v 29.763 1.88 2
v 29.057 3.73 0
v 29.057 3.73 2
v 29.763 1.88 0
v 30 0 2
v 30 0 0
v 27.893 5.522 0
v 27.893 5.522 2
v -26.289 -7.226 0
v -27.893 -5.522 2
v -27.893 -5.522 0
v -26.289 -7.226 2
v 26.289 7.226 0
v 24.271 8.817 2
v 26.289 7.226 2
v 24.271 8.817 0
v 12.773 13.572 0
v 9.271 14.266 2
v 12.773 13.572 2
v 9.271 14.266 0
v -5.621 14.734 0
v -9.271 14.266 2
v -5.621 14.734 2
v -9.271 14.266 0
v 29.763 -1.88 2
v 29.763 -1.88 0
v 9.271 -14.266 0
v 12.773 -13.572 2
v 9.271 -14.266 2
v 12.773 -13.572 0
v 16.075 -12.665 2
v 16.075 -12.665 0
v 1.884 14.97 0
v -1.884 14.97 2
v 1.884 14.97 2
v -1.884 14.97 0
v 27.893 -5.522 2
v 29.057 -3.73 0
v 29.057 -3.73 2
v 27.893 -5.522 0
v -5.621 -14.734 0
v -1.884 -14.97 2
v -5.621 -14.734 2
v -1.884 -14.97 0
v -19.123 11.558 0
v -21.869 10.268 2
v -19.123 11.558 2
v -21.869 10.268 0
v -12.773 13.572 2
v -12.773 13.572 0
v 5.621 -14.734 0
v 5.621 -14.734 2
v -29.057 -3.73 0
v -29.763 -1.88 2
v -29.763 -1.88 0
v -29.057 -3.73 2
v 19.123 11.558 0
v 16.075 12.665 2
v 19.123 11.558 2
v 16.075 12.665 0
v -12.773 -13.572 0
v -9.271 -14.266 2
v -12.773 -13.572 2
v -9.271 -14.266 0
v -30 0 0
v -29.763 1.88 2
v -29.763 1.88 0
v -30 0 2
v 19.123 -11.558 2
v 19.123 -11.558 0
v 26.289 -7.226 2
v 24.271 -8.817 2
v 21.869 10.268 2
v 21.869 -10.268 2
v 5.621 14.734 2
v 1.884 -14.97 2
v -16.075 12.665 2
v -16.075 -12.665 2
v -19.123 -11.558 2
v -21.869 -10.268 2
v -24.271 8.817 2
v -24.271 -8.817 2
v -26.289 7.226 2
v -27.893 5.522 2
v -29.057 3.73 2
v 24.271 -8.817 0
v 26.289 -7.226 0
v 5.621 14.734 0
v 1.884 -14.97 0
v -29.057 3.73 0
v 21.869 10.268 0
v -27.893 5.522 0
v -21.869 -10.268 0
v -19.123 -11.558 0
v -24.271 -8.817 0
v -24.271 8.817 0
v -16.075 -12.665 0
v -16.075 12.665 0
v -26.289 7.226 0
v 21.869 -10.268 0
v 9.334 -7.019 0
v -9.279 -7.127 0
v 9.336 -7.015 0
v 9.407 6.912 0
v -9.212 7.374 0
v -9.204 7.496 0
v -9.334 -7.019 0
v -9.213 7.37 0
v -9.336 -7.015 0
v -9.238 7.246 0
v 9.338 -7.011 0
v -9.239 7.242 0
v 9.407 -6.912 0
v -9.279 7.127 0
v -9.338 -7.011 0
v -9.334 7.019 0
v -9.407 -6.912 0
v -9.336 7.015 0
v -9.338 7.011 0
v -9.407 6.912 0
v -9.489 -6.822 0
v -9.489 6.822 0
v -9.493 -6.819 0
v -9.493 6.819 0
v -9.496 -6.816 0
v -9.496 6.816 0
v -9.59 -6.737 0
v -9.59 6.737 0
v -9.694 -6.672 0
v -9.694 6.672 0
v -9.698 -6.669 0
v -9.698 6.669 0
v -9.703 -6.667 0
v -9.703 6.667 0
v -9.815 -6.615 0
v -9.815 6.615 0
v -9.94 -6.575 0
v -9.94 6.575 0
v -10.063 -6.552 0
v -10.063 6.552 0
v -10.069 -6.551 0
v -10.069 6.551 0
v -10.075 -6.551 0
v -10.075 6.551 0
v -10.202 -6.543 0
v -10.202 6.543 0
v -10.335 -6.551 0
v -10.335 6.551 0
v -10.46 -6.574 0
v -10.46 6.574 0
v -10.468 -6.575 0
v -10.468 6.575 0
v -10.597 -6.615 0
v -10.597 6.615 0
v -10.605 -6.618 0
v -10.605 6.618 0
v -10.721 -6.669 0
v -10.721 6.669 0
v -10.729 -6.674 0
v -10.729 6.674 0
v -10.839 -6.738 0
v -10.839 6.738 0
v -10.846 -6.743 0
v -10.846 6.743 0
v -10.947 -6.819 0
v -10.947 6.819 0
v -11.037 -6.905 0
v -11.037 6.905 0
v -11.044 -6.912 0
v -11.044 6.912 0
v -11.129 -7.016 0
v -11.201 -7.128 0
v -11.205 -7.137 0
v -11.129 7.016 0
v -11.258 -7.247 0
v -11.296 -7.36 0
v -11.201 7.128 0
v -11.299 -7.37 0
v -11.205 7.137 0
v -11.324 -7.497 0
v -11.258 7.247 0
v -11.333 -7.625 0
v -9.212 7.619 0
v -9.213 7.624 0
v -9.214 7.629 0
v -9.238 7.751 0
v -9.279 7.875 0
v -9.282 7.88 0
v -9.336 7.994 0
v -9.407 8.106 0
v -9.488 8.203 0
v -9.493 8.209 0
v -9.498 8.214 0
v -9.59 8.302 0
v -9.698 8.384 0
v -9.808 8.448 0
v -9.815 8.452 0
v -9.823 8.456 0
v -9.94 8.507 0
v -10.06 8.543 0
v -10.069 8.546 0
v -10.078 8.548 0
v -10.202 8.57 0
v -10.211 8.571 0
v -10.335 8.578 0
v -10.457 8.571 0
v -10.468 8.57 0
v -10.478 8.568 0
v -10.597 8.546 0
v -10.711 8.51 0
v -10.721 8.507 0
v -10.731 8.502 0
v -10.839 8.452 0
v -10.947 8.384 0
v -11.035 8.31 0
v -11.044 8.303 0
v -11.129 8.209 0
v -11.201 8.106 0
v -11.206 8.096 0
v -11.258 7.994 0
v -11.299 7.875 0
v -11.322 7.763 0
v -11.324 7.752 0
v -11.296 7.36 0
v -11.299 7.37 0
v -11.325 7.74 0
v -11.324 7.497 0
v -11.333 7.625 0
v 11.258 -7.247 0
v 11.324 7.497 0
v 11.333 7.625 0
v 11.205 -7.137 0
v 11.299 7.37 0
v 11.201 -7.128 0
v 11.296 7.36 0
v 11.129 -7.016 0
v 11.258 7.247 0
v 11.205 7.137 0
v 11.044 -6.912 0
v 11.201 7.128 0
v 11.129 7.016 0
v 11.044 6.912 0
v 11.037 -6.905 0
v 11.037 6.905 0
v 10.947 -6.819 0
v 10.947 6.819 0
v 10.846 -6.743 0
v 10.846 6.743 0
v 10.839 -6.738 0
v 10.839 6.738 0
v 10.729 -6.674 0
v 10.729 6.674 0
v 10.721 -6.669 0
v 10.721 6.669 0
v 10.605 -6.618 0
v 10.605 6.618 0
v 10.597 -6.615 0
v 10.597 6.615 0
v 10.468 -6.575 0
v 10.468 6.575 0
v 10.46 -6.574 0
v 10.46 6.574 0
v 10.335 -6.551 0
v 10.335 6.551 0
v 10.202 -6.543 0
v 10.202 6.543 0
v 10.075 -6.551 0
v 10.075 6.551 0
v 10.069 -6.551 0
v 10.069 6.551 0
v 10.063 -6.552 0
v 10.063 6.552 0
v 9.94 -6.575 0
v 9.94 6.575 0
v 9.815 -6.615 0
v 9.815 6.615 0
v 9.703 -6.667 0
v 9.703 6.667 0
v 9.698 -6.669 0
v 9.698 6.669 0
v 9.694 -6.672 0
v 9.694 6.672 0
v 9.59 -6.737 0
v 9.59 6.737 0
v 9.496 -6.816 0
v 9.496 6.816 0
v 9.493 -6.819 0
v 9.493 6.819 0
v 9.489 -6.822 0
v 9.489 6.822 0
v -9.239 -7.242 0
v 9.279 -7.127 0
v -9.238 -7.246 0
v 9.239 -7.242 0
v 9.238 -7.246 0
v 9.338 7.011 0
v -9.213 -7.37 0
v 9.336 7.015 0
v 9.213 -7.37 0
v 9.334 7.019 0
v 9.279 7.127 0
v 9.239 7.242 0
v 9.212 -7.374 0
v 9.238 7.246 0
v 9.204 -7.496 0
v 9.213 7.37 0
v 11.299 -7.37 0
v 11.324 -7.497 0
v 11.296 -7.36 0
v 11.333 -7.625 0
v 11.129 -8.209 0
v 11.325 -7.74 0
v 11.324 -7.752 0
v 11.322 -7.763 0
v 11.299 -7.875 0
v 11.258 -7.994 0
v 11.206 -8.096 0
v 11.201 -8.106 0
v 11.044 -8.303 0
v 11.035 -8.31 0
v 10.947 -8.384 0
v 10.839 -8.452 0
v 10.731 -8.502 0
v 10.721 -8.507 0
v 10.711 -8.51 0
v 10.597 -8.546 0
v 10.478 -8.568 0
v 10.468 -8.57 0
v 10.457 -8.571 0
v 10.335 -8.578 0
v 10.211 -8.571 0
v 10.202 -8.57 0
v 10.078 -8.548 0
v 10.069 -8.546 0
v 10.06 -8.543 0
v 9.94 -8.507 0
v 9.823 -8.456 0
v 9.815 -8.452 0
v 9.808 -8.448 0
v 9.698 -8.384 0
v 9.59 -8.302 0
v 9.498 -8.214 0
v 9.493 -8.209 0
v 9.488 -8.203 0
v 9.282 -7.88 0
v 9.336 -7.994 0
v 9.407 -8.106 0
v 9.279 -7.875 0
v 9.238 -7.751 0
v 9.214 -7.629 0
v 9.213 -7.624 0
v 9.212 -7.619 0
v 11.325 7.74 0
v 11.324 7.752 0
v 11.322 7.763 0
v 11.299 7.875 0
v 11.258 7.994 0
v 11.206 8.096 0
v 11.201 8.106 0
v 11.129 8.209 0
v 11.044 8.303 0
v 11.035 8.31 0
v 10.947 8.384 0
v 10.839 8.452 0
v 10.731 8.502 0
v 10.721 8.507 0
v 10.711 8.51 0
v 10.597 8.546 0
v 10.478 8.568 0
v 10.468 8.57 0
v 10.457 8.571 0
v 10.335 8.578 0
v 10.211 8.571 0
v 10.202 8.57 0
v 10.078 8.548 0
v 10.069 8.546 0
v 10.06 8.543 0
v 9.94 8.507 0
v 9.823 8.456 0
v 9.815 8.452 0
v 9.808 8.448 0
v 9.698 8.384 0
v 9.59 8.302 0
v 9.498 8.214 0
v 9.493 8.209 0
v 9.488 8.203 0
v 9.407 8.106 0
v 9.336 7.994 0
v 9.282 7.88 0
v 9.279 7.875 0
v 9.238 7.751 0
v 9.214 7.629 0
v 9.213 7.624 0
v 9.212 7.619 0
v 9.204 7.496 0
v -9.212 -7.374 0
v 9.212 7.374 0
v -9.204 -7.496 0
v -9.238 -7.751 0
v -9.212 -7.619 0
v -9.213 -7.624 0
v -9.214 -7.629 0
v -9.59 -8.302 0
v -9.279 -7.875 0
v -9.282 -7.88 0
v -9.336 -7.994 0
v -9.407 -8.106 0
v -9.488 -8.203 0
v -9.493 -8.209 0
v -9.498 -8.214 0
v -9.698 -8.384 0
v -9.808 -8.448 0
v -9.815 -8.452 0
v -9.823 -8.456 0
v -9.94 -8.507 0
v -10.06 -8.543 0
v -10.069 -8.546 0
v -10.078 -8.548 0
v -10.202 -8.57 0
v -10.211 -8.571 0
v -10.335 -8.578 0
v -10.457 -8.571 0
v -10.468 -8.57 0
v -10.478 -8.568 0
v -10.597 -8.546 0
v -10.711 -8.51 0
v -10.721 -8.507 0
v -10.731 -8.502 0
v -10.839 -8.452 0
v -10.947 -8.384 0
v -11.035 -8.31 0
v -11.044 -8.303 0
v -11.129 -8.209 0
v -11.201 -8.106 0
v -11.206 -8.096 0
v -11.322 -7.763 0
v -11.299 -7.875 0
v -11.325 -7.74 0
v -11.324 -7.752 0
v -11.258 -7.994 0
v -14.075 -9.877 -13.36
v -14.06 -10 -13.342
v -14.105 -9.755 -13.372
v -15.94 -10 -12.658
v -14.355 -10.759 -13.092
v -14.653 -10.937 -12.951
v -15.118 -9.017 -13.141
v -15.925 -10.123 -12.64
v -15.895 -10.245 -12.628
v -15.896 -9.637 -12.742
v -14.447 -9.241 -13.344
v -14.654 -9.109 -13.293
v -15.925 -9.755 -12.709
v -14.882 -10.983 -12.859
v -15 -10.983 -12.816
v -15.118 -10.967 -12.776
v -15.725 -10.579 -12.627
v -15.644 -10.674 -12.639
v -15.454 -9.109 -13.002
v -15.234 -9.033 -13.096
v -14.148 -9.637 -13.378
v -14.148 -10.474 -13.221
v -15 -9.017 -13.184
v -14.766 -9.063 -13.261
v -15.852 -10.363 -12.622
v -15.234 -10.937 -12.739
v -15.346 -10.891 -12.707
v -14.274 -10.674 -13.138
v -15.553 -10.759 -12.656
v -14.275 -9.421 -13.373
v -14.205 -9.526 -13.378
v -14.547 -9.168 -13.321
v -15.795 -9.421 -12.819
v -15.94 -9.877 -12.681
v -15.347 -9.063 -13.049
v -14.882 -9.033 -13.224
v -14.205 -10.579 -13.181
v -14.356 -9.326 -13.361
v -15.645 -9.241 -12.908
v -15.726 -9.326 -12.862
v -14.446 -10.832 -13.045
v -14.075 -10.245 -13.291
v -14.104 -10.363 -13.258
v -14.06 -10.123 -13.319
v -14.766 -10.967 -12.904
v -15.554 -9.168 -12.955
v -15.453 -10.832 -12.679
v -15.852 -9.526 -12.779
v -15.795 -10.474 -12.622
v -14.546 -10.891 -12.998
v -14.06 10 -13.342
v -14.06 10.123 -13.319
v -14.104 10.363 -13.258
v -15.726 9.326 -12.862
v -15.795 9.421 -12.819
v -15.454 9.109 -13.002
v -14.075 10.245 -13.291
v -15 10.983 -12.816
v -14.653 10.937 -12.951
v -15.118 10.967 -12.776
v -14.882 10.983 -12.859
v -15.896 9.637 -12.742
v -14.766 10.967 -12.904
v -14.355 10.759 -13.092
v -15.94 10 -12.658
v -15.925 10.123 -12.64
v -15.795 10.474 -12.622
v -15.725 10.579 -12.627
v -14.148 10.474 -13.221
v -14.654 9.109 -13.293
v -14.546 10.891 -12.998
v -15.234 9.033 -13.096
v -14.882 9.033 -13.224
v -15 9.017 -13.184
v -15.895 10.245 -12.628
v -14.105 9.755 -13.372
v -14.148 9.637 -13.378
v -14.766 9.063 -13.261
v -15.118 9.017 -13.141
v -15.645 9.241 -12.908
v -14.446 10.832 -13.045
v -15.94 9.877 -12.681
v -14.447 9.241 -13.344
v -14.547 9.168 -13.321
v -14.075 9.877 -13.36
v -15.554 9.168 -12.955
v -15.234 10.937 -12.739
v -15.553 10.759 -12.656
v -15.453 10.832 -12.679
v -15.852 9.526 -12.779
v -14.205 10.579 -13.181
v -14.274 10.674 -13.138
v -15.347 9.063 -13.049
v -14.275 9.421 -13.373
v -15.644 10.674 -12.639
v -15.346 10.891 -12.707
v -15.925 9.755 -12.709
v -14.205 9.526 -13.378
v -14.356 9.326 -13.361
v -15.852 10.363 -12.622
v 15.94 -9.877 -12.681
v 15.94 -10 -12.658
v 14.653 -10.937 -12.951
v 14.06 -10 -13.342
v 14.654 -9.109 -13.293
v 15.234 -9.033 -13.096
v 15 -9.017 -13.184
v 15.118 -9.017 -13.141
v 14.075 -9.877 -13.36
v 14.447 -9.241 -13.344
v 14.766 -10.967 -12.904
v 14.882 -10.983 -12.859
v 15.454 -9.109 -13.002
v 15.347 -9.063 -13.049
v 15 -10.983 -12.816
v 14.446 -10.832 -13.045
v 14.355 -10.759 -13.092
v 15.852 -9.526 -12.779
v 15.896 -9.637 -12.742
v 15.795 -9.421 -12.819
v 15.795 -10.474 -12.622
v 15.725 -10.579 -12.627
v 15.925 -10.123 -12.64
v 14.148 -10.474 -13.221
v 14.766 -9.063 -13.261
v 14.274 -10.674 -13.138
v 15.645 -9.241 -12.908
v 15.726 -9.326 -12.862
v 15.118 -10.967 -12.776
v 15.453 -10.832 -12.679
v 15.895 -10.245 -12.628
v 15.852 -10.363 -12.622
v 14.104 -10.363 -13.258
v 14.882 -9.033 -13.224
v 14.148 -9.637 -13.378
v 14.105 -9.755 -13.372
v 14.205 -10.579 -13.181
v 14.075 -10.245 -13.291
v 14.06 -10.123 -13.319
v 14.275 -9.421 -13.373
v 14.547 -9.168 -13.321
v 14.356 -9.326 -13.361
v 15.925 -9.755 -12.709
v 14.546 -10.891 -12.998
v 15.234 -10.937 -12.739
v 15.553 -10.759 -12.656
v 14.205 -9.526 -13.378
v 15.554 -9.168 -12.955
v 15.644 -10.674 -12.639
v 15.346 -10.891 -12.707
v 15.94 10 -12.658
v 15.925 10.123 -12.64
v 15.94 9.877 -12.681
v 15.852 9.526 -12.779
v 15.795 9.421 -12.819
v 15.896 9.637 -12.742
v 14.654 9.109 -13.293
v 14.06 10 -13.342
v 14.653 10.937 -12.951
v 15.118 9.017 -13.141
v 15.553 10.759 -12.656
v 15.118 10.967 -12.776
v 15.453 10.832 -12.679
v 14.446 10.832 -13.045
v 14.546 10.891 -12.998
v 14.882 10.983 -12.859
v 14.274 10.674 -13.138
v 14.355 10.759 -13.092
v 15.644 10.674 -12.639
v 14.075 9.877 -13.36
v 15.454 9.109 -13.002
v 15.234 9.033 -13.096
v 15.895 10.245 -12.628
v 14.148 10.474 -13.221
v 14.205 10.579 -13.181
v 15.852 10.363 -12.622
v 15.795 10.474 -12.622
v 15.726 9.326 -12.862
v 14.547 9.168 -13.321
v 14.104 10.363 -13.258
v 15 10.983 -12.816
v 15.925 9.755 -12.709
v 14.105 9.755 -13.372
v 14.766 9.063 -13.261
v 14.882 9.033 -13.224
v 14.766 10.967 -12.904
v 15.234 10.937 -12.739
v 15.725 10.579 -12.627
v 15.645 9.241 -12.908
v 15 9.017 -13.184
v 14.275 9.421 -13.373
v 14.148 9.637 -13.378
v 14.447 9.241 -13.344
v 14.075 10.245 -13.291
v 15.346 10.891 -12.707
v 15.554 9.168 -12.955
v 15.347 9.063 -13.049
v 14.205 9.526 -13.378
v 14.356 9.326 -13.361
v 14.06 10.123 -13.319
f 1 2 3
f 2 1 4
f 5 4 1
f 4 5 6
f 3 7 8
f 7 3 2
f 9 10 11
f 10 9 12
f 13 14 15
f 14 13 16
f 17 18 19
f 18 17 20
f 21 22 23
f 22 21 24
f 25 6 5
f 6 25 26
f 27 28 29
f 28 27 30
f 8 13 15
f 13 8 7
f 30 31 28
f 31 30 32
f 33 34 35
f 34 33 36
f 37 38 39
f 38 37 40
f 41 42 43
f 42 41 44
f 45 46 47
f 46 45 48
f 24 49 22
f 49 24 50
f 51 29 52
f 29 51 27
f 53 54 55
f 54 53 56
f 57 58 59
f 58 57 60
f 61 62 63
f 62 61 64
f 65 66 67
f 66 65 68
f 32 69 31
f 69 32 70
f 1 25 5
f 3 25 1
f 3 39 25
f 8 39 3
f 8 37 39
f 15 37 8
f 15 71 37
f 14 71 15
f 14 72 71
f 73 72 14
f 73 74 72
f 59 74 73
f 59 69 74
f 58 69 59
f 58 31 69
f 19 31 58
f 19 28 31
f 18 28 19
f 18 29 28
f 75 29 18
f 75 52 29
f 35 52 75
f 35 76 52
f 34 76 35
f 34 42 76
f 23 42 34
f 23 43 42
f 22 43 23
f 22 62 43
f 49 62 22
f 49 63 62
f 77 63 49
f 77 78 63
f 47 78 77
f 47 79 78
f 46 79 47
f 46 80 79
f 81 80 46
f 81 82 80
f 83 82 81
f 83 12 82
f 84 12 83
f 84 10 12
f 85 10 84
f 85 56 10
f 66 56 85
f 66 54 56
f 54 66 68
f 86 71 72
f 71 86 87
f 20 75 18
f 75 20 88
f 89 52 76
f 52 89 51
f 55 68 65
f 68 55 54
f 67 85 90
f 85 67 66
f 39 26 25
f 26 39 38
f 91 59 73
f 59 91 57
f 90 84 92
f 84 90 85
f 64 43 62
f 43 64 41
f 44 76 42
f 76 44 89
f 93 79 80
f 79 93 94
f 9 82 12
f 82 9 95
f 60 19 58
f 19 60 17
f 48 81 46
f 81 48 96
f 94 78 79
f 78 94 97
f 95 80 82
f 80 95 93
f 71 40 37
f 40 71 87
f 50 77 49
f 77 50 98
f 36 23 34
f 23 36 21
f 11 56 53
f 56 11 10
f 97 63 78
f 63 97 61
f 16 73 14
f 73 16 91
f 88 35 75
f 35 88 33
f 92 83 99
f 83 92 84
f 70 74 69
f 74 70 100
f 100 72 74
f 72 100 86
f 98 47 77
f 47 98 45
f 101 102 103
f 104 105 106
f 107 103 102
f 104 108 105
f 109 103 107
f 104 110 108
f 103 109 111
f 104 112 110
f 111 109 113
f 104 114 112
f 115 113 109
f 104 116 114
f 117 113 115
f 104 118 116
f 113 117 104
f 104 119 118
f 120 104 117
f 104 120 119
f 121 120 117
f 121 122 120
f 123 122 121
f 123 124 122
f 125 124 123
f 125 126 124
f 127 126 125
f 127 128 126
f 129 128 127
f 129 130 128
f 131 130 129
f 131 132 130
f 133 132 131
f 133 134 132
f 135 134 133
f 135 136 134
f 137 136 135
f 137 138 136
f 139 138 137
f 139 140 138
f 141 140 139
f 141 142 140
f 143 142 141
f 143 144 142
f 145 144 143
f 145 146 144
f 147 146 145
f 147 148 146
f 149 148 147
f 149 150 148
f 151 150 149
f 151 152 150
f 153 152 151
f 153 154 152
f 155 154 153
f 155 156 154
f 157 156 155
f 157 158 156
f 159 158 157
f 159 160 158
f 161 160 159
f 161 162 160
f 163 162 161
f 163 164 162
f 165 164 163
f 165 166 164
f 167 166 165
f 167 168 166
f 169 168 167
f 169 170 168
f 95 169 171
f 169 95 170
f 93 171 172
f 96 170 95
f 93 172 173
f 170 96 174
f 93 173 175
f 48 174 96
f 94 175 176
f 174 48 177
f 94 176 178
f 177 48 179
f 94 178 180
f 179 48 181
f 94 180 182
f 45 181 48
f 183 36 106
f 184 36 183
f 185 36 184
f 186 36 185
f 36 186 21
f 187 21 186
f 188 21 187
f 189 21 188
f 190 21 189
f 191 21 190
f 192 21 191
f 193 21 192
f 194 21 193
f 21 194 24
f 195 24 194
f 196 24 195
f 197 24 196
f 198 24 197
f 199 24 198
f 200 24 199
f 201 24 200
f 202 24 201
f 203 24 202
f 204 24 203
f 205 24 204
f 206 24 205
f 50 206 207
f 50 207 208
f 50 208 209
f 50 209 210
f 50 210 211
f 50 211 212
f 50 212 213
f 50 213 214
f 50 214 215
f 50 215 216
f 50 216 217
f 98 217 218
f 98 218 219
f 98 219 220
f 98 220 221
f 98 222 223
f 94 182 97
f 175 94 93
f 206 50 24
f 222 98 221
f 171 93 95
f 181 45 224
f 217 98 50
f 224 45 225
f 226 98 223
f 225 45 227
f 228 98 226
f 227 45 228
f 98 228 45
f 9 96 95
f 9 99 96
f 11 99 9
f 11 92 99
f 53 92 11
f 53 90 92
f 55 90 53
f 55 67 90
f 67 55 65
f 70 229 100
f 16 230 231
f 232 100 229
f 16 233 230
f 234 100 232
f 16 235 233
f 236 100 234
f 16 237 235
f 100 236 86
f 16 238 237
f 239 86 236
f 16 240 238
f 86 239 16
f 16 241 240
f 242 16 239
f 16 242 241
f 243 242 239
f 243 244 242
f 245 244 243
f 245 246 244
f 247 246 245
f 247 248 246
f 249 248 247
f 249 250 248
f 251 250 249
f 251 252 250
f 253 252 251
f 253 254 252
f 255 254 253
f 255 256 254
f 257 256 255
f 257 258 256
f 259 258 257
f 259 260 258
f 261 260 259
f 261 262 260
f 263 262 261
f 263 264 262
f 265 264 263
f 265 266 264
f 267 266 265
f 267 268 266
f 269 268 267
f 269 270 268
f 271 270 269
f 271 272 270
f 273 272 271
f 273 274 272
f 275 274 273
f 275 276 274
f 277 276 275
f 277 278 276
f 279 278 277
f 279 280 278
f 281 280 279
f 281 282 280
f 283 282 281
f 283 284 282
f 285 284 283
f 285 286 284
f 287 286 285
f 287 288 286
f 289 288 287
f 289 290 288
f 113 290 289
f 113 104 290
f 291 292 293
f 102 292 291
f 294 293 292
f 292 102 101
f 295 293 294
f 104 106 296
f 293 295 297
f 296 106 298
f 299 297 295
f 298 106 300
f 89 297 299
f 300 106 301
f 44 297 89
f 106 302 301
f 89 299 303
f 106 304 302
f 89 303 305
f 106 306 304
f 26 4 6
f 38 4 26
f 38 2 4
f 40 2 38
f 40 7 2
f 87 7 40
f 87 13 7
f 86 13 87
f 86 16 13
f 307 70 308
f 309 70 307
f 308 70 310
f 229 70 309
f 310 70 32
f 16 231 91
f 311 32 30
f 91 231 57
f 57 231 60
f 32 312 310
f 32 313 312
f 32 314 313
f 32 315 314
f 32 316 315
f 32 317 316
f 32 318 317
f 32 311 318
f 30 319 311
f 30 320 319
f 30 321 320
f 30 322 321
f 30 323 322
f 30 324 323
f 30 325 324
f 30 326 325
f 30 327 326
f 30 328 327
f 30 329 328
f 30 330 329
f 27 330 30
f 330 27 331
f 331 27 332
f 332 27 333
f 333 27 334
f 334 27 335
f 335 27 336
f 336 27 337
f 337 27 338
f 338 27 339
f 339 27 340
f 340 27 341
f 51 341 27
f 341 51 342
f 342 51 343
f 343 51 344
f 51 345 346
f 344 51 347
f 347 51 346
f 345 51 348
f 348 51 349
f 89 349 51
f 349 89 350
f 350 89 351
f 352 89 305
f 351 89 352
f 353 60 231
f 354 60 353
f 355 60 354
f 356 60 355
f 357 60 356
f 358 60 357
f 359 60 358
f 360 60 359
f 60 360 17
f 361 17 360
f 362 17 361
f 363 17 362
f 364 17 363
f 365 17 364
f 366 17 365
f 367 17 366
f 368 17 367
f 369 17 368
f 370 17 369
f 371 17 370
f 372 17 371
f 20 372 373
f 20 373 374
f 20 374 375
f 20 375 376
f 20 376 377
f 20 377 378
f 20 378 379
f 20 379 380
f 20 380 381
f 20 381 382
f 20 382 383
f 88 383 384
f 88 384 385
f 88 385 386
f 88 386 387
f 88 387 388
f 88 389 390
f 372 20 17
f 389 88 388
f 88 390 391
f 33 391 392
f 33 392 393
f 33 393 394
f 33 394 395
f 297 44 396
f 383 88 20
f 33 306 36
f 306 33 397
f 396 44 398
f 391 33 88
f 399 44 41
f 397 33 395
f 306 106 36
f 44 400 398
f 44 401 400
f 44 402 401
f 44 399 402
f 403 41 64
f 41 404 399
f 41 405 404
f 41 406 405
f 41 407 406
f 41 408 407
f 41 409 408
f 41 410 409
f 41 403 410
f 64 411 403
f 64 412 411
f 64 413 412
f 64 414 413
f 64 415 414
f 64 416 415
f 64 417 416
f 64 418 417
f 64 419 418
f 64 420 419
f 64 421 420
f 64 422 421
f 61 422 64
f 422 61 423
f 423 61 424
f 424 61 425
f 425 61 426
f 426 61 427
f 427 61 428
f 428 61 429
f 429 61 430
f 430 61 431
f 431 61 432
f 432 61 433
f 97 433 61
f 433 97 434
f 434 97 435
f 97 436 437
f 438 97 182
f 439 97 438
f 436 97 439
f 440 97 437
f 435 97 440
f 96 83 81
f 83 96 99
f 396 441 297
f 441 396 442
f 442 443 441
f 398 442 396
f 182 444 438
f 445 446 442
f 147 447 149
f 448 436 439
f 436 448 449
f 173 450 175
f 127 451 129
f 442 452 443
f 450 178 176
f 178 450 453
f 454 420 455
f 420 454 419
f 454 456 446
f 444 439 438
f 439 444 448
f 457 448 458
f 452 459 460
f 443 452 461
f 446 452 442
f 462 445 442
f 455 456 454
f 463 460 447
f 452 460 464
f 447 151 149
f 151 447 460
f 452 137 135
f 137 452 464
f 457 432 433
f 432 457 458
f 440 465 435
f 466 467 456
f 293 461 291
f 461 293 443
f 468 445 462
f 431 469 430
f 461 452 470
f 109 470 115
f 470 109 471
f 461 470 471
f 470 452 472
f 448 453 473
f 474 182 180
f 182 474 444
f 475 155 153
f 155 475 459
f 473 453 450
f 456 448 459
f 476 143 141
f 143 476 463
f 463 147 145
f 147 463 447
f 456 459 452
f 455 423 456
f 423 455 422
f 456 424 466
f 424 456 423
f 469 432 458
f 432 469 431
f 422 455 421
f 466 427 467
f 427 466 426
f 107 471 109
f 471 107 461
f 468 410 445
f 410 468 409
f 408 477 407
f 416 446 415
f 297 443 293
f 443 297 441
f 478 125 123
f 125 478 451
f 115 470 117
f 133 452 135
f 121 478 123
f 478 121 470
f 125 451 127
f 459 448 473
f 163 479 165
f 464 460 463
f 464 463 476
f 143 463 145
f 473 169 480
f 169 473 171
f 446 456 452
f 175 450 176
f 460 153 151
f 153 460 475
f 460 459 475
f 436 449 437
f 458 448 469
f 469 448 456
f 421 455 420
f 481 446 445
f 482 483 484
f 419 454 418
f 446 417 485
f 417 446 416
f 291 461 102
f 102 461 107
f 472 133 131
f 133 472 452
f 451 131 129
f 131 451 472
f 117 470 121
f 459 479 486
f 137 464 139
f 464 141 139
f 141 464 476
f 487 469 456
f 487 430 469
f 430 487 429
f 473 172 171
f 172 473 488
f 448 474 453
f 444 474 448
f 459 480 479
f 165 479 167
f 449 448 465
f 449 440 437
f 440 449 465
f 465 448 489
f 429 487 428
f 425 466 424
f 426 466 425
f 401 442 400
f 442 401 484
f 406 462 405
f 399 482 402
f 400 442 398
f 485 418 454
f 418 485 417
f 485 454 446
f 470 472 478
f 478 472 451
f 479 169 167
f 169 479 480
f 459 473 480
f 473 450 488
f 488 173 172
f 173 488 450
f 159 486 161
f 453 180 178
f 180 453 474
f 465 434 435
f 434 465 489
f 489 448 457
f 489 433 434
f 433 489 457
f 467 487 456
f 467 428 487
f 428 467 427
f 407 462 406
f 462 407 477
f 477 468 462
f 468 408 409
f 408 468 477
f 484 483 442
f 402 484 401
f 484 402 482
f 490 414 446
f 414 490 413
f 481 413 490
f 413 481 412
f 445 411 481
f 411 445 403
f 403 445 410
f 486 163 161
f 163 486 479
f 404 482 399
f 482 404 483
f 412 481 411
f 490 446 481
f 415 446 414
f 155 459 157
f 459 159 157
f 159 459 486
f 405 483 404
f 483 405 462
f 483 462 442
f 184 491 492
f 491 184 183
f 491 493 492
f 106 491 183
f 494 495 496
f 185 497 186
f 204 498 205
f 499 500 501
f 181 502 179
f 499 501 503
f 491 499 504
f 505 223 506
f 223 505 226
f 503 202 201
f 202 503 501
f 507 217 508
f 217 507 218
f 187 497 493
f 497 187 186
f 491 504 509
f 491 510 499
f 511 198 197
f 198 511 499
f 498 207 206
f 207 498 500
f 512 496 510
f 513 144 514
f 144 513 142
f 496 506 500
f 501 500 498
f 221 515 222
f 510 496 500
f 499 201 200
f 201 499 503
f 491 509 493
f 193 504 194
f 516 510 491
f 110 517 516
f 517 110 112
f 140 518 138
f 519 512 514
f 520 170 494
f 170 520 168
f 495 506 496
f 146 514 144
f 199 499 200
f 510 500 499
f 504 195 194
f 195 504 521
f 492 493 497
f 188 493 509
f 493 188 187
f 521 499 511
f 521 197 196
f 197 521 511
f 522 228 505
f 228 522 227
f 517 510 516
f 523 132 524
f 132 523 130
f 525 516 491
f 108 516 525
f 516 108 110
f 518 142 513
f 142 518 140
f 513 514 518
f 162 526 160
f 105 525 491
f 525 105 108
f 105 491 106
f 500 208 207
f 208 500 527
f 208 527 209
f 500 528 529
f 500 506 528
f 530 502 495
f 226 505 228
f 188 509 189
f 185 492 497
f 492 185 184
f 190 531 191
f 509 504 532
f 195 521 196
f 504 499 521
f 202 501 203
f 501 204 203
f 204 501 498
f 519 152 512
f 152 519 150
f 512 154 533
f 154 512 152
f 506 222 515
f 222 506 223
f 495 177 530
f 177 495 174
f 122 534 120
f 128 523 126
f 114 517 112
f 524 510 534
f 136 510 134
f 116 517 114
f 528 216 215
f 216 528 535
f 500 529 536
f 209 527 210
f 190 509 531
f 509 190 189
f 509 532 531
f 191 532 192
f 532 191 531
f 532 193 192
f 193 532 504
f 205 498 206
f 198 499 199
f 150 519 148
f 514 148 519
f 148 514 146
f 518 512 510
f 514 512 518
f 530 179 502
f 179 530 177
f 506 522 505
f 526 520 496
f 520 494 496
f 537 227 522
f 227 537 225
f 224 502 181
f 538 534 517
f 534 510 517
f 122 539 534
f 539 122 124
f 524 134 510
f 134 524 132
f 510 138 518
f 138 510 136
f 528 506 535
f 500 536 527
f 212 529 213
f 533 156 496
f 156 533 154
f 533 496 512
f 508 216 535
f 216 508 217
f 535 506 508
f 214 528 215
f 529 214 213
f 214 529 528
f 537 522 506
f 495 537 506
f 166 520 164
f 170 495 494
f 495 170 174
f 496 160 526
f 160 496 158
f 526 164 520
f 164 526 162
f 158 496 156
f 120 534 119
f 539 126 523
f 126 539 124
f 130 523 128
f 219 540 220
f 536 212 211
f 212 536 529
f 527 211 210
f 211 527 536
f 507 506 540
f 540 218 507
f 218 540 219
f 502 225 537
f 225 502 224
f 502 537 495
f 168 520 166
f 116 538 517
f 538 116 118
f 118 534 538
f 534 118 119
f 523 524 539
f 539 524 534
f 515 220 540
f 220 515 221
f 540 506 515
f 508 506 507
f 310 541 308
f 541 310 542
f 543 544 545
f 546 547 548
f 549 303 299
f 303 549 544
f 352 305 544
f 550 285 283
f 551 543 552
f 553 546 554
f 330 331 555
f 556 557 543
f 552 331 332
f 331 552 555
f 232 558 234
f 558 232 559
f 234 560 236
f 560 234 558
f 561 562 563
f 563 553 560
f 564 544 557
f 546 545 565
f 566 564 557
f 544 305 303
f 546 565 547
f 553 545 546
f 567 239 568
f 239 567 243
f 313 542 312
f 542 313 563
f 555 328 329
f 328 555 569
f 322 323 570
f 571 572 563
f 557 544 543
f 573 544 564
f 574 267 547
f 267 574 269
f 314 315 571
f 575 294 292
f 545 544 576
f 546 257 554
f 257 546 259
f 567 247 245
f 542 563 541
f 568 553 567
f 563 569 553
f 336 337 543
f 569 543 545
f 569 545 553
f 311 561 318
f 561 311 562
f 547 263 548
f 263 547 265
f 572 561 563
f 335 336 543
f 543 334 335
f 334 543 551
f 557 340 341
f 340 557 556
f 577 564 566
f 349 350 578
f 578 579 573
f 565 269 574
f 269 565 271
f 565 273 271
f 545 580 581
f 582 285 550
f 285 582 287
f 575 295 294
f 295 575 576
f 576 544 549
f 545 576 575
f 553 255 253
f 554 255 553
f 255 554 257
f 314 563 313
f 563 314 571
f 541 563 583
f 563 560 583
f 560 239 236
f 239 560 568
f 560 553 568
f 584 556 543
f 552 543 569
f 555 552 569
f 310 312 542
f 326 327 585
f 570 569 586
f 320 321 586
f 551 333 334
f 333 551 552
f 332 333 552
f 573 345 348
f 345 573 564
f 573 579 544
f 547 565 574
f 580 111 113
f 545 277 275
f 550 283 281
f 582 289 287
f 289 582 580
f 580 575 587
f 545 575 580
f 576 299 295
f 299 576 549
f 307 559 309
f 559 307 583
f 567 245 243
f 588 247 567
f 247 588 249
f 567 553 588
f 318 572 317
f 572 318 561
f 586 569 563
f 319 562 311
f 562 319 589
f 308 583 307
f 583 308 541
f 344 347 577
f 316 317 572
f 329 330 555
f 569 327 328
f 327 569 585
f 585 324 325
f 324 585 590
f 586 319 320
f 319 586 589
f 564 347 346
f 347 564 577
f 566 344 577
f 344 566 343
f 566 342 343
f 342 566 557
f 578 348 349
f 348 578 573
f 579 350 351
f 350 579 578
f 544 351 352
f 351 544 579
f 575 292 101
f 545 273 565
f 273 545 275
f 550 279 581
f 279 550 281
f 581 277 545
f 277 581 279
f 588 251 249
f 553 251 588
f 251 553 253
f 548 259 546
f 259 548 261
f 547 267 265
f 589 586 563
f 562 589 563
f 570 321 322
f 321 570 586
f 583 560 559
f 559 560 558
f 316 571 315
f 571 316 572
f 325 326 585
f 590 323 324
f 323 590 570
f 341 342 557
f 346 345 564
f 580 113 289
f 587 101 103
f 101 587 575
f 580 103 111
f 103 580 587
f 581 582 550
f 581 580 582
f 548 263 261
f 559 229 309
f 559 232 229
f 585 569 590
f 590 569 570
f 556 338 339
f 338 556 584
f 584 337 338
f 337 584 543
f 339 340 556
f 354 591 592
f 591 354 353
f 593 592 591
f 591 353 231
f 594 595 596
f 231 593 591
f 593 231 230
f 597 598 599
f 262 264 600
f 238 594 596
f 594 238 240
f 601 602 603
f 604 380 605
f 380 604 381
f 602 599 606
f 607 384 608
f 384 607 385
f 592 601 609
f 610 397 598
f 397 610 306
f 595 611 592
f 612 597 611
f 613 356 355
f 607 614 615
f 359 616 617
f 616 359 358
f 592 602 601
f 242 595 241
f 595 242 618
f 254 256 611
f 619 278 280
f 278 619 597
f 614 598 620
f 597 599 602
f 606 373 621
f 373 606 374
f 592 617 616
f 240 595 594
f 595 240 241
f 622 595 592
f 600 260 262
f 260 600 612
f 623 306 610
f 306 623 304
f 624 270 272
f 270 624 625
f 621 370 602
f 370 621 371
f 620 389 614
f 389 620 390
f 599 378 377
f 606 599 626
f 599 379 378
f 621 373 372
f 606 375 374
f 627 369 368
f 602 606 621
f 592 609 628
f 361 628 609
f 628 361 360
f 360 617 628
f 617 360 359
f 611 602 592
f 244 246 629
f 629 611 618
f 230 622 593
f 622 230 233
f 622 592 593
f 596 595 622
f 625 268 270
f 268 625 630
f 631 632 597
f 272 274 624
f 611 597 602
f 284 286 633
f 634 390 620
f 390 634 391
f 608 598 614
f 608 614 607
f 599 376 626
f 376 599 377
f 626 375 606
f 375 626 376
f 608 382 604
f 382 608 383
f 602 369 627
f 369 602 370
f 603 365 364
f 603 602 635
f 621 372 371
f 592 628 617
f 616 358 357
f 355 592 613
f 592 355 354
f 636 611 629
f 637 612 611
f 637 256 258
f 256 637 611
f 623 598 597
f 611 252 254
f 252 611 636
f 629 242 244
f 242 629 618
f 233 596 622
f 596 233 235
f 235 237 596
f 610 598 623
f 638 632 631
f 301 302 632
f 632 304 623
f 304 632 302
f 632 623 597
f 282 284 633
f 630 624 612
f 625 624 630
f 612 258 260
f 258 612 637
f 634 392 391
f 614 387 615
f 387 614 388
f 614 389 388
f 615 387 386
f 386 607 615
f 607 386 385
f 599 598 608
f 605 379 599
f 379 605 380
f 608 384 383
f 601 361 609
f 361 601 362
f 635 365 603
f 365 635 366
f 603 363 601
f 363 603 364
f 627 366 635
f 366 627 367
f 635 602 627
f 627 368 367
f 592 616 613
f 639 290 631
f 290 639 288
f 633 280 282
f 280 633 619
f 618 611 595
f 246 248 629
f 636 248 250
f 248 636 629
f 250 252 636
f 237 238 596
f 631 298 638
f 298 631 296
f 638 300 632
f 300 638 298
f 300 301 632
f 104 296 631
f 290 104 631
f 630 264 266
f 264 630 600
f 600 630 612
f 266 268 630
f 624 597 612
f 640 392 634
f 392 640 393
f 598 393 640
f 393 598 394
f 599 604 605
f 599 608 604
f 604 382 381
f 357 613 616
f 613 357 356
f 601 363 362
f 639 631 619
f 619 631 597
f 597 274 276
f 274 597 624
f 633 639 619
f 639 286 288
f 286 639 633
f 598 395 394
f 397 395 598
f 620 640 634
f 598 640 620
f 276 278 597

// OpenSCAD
//Transforming Shapes - Design Time: Modern Table

$fn =50;

scale([3, 1.5, 1]) cylinder(h=2, r=10);//table top

translate([-15, -10, -13]) rotate([-10,20,0]) cylinder(h=15, r=1);//left legs
translate([-15, 10, -13]) rotate([10,20,0]) cylinder(h=15, r=1);

translate([15, -10, -13]) rotate([-10,-20,0]) cylinder(h=15, r=1);//right legs
translate([15, 10,-13]) rotate([10,-20,0]) cylinder(h=15, r=1);
